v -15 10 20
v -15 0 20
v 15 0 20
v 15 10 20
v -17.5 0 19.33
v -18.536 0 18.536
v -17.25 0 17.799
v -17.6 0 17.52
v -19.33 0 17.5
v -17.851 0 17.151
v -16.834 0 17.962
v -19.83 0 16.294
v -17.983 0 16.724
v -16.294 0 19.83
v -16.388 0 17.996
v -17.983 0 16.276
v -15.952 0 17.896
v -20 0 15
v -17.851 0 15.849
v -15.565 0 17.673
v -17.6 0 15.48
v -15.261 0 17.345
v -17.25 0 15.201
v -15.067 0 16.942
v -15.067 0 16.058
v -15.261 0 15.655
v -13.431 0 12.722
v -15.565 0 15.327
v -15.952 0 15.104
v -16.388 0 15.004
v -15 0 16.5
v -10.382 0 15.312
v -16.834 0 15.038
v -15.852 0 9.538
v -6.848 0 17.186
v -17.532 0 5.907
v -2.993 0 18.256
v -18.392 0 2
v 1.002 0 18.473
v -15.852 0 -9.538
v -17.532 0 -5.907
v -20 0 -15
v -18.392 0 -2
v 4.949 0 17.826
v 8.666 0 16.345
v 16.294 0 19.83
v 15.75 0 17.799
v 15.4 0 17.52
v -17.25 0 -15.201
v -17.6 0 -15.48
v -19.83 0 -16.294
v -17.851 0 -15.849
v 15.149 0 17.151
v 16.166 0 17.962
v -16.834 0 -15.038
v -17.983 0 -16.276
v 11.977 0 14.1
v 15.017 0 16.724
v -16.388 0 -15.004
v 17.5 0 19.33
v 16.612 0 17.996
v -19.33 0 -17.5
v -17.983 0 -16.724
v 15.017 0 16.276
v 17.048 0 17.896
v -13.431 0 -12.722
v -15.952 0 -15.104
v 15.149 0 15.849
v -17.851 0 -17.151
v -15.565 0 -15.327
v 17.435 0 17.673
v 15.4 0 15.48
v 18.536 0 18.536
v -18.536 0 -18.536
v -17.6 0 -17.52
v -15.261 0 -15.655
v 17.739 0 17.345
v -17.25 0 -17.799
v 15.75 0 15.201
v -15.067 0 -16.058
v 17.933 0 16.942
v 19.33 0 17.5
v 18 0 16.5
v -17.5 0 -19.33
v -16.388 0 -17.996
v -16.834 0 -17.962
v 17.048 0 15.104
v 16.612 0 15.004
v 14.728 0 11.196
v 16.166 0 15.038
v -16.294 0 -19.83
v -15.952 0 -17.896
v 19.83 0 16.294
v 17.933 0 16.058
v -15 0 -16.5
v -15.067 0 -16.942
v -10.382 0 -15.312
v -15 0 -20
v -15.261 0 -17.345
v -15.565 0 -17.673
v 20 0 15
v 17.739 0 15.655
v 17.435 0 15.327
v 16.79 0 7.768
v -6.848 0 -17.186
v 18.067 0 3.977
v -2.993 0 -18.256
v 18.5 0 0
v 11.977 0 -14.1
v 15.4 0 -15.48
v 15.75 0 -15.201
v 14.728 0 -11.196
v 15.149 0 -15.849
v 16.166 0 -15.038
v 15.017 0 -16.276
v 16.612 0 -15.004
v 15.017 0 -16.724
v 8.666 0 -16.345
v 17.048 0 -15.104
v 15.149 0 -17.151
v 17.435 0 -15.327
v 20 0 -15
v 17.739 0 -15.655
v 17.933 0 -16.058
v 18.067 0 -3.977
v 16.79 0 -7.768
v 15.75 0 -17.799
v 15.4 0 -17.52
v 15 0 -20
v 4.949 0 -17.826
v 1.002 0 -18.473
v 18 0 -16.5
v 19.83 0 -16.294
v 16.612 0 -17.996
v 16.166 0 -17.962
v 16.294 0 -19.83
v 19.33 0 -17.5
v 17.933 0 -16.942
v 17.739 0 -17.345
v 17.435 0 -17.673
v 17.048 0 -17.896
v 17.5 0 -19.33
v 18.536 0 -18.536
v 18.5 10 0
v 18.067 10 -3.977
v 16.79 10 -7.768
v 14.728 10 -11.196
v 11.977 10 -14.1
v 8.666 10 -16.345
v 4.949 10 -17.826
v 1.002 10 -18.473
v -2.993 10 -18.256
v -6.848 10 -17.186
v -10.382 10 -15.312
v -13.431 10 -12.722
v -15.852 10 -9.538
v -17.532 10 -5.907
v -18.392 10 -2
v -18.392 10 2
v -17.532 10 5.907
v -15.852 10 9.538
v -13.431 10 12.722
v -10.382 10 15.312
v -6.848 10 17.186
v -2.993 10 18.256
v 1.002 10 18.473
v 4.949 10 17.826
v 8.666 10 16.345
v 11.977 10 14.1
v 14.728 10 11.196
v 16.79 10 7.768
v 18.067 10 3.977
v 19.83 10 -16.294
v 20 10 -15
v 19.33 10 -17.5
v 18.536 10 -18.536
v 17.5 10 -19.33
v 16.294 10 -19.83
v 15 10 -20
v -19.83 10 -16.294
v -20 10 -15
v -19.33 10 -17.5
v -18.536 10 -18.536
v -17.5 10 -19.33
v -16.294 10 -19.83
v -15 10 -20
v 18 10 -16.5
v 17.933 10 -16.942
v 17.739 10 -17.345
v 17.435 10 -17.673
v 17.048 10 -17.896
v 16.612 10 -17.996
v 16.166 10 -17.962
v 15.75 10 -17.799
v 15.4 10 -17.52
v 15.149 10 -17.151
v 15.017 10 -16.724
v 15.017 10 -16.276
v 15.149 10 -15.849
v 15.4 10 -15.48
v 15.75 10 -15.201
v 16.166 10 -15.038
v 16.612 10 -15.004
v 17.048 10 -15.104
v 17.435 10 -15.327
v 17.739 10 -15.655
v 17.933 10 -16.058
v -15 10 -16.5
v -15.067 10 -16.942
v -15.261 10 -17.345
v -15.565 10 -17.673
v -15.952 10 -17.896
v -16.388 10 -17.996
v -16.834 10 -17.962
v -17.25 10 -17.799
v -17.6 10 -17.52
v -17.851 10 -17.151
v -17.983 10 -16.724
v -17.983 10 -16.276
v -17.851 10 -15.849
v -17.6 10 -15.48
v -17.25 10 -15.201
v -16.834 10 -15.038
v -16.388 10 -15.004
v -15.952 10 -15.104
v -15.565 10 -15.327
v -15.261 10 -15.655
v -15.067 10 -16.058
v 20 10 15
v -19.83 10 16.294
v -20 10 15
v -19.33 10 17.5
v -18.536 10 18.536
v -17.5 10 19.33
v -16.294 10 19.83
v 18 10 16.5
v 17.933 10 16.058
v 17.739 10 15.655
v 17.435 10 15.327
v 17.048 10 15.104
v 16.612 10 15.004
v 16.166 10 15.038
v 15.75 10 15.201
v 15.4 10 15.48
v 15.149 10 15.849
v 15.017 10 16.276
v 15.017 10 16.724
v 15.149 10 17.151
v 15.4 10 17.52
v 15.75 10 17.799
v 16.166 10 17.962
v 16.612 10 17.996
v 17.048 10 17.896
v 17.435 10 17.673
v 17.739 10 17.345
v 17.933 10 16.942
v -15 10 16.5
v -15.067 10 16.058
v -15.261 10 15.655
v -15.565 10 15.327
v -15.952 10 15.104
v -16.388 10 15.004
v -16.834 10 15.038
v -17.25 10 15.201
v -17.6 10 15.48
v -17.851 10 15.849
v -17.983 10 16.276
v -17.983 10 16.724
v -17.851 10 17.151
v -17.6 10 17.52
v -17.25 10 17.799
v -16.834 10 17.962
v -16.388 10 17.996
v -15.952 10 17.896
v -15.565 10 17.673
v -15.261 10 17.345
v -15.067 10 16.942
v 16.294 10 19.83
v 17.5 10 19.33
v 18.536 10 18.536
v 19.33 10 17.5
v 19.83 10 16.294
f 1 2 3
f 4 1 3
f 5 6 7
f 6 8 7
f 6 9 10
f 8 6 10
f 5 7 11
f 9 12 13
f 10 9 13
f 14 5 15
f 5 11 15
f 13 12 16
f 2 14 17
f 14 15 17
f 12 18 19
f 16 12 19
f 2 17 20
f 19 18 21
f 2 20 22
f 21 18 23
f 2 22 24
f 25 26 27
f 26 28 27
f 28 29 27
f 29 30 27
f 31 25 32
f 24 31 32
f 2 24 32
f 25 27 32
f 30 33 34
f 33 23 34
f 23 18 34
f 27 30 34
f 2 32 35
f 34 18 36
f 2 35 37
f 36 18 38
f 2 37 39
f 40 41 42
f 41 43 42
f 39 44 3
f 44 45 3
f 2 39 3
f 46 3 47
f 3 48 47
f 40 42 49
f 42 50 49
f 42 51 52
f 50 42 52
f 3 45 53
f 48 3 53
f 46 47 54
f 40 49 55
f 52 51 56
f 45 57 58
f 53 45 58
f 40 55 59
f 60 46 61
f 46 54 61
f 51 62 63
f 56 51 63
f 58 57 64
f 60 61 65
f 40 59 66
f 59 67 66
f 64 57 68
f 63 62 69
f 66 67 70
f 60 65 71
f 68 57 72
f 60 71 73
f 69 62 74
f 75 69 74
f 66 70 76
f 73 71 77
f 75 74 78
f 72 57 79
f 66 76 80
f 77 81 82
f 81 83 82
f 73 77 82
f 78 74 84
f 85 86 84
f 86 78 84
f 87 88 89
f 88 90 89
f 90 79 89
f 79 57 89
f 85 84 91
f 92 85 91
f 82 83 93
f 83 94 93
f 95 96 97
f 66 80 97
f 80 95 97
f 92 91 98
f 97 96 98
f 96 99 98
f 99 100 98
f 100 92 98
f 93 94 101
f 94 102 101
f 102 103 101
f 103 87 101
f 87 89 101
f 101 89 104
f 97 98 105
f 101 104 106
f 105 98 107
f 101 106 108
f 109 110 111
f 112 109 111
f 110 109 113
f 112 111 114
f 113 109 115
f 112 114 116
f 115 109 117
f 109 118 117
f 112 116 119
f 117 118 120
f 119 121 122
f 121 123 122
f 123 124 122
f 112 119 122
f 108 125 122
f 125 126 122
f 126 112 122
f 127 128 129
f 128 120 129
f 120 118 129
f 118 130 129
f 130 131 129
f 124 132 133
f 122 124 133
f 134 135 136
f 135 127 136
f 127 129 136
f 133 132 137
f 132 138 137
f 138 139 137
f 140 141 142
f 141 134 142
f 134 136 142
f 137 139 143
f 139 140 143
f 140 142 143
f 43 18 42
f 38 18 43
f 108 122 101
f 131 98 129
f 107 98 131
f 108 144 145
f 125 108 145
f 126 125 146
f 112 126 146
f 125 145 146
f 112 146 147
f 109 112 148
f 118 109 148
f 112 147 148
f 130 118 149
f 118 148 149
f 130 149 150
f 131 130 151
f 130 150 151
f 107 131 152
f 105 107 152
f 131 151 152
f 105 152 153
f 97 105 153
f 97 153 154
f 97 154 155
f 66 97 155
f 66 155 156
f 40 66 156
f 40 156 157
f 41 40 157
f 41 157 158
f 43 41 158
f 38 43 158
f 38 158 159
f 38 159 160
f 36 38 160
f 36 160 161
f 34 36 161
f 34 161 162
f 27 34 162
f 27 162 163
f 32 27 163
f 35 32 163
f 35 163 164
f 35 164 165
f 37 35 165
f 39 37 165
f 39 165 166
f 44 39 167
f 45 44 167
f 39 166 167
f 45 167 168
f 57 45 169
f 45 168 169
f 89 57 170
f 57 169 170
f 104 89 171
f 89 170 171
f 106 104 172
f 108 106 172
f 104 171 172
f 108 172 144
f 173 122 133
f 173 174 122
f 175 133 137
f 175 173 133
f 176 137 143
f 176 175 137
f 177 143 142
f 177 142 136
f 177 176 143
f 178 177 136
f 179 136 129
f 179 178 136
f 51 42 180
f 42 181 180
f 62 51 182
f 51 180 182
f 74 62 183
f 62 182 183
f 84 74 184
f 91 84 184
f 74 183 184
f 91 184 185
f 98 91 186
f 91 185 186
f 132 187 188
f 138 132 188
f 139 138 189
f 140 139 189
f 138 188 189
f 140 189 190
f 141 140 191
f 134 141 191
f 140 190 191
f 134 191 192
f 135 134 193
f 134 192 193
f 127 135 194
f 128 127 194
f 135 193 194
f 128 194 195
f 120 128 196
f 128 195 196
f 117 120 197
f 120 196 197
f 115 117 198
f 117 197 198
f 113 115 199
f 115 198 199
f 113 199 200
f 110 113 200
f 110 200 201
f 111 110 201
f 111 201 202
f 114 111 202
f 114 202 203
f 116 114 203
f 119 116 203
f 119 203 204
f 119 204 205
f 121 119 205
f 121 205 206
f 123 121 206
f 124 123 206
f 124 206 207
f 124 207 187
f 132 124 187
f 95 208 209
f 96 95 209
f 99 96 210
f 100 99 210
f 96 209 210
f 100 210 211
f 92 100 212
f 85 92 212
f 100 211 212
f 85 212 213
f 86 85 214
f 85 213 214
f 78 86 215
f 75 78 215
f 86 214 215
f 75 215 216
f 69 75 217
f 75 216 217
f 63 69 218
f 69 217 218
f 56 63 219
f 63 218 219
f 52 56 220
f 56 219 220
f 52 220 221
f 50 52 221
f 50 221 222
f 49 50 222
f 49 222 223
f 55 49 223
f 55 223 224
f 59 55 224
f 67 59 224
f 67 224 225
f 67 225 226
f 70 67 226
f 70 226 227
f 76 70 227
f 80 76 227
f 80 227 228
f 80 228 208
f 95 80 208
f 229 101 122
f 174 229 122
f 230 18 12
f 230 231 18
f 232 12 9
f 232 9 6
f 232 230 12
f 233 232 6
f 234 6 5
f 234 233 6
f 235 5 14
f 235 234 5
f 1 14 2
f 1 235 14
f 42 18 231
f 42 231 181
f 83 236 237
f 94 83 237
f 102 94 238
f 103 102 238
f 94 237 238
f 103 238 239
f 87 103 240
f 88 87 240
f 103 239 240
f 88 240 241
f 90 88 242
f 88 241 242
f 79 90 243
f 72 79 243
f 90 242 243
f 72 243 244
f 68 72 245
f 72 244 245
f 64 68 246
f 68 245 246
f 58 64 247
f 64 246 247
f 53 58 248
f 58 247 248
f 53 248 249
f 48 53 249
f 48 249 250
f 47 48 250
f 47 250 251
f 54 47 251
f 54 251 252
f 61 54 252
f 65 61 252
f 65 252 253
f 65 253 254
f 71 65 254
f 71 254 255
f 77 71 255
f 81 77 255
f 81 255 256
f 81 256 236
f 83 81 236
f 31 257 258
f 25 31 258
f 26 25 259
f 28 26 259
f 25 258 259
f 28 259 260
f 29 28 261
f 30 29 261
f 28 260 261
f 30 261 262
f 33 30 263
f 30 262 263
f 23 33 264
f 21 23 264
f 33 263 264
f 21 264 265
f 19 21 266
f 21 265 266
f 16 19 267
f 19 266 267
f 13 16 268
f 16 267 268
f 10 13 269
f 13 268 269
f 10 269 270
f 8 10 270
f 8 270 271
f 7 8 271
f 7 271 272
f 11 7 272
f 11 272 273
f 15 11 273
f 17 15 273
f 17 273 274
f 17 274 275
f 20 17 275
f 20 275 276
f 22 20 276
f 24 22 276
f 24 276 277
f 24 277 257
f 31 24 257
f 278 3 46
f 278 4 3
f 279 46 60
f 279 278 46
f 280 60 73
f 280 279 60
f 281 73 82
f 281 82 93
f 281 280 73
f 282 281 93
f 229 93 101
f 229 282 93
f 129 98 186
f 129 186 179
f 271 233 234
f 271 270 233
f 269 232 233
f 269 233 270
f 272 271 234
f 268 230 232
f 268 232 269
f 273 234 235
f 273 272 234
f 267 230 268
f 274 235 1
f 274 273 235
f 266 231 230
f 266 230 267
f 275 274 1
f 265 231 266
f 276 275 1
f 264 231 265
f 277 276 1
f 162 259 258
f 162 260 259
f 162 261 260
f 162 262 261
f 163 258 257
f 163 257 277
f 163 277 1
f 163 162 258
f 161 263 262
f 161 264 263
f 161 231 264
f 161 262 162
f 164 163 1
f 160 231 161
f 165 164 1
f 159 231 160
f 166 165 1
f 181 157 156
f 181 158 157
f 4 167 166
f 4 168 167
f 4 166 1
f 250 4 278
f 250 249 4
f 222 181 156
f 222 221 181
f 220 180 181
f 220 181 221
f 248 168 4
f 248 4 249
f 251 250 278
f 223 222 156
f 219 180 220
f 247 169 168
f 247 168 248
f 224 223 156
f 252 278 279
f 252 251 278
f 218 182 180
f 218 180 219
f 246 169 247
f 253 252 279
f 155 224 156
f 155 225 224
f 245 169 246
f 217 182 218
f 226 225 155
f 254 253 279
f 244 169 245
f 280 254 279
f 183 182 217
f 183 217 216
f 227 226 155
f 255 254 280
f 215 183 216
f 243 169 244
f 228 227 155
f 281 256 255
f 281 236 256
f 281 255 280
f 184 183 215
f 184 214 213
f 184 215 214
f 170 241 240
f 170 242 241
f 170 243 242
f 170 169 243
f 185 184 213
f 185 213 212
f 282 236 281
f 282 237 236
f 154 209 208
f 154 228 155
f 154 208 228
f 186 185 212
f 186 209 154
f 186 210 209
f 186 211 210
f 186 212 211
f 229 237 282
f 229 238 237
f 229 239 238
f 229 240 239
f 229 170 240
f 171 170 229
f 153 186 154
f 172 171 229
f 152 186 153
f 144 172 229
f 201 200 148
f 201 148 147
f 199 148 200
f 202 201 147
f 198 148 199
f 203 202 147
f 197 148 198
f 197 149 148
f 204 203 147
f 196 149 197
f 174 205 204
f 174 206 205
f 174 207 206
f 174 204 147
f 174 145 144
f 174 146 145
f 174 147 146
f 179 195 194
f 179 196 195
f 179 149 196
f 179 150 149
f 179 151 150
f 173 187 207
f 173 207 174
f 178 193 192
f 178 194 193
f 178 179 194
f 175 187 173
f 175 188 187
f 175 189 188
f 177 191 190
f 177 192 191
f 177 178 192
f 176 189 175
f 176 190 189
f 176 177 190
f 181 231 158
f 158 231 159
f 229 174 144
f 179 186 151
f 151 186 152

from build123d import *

# Parameters (mm, degrees)
SKETCH1_W           = 40
SKETCH1_H           = 40
BOSS_EXTRUDE1_DEPTH = 10
FILLET1_R           = 5
SKETCH2_R           = 18.5
CUT_EXTRUDE1_DEPTH  = 11
SKETCH3_R           = 1.5
CUT_EXTRUDE2_DEPTH  = 11


with BuildPart() as part:
    # Sketch1 → Boss-Extrude1 (new body)
    with BuildSketch(Plane(origin=(0, 0, 0), x_dir=(1, 0, 0), z_dir=(0, 1, 0))):
        Rectangle(SKETCH1_W, SKETCH1_H)
    extrude(amount=BOSS_EXTRUDE1_DEPTH)

    # Fillet1
    fillet1_edges = [part.edges().sort_by_distance(p)[0] for p in [
        (20, 5, 20),
        (-20, 5, 20),
        (-20, 5, -20),
        (20, 5, -20),
    ]]
    fillet(fillet1_edges, radius=FILLET1_R)

    # Sketch2 → Cut-Extrude1 (cut, through all)
    with BuildSketch(Plane(origin=(0, 10, 0), x_dir=(1, 0, 0), z_dir=(0, 1, 0))):
        Circle(SKETCH2_R)
    extrude(amount=-CUT_EXTRUDE1_DEPTH, mode=Mode.SUBTRACT)

    # Sketch3 → Cut-Extrude2 (cut, through all)
    with BuildSketch(Plane(origin=(0, 10, 0), x_dir=(1, 0, 0), z_dir=(0, 1, 0))):
        with Locations((-16.5, 16.5)):
            Circle(SKETCH3_R)
        with Locations((16.5, 16.5)):
            Circle(SKETCH3_R)
        with Locations((16.5, -16.5)):
            Circle(SKETCH3_R)
        with Locations((-16.5, -16.5)):
            Circle(SKETCH3_R)
    extrude(amount=-CUT_EXTRUDE2_DEPTH, mode=Mode.SUBTRACT)


solid = part.part
